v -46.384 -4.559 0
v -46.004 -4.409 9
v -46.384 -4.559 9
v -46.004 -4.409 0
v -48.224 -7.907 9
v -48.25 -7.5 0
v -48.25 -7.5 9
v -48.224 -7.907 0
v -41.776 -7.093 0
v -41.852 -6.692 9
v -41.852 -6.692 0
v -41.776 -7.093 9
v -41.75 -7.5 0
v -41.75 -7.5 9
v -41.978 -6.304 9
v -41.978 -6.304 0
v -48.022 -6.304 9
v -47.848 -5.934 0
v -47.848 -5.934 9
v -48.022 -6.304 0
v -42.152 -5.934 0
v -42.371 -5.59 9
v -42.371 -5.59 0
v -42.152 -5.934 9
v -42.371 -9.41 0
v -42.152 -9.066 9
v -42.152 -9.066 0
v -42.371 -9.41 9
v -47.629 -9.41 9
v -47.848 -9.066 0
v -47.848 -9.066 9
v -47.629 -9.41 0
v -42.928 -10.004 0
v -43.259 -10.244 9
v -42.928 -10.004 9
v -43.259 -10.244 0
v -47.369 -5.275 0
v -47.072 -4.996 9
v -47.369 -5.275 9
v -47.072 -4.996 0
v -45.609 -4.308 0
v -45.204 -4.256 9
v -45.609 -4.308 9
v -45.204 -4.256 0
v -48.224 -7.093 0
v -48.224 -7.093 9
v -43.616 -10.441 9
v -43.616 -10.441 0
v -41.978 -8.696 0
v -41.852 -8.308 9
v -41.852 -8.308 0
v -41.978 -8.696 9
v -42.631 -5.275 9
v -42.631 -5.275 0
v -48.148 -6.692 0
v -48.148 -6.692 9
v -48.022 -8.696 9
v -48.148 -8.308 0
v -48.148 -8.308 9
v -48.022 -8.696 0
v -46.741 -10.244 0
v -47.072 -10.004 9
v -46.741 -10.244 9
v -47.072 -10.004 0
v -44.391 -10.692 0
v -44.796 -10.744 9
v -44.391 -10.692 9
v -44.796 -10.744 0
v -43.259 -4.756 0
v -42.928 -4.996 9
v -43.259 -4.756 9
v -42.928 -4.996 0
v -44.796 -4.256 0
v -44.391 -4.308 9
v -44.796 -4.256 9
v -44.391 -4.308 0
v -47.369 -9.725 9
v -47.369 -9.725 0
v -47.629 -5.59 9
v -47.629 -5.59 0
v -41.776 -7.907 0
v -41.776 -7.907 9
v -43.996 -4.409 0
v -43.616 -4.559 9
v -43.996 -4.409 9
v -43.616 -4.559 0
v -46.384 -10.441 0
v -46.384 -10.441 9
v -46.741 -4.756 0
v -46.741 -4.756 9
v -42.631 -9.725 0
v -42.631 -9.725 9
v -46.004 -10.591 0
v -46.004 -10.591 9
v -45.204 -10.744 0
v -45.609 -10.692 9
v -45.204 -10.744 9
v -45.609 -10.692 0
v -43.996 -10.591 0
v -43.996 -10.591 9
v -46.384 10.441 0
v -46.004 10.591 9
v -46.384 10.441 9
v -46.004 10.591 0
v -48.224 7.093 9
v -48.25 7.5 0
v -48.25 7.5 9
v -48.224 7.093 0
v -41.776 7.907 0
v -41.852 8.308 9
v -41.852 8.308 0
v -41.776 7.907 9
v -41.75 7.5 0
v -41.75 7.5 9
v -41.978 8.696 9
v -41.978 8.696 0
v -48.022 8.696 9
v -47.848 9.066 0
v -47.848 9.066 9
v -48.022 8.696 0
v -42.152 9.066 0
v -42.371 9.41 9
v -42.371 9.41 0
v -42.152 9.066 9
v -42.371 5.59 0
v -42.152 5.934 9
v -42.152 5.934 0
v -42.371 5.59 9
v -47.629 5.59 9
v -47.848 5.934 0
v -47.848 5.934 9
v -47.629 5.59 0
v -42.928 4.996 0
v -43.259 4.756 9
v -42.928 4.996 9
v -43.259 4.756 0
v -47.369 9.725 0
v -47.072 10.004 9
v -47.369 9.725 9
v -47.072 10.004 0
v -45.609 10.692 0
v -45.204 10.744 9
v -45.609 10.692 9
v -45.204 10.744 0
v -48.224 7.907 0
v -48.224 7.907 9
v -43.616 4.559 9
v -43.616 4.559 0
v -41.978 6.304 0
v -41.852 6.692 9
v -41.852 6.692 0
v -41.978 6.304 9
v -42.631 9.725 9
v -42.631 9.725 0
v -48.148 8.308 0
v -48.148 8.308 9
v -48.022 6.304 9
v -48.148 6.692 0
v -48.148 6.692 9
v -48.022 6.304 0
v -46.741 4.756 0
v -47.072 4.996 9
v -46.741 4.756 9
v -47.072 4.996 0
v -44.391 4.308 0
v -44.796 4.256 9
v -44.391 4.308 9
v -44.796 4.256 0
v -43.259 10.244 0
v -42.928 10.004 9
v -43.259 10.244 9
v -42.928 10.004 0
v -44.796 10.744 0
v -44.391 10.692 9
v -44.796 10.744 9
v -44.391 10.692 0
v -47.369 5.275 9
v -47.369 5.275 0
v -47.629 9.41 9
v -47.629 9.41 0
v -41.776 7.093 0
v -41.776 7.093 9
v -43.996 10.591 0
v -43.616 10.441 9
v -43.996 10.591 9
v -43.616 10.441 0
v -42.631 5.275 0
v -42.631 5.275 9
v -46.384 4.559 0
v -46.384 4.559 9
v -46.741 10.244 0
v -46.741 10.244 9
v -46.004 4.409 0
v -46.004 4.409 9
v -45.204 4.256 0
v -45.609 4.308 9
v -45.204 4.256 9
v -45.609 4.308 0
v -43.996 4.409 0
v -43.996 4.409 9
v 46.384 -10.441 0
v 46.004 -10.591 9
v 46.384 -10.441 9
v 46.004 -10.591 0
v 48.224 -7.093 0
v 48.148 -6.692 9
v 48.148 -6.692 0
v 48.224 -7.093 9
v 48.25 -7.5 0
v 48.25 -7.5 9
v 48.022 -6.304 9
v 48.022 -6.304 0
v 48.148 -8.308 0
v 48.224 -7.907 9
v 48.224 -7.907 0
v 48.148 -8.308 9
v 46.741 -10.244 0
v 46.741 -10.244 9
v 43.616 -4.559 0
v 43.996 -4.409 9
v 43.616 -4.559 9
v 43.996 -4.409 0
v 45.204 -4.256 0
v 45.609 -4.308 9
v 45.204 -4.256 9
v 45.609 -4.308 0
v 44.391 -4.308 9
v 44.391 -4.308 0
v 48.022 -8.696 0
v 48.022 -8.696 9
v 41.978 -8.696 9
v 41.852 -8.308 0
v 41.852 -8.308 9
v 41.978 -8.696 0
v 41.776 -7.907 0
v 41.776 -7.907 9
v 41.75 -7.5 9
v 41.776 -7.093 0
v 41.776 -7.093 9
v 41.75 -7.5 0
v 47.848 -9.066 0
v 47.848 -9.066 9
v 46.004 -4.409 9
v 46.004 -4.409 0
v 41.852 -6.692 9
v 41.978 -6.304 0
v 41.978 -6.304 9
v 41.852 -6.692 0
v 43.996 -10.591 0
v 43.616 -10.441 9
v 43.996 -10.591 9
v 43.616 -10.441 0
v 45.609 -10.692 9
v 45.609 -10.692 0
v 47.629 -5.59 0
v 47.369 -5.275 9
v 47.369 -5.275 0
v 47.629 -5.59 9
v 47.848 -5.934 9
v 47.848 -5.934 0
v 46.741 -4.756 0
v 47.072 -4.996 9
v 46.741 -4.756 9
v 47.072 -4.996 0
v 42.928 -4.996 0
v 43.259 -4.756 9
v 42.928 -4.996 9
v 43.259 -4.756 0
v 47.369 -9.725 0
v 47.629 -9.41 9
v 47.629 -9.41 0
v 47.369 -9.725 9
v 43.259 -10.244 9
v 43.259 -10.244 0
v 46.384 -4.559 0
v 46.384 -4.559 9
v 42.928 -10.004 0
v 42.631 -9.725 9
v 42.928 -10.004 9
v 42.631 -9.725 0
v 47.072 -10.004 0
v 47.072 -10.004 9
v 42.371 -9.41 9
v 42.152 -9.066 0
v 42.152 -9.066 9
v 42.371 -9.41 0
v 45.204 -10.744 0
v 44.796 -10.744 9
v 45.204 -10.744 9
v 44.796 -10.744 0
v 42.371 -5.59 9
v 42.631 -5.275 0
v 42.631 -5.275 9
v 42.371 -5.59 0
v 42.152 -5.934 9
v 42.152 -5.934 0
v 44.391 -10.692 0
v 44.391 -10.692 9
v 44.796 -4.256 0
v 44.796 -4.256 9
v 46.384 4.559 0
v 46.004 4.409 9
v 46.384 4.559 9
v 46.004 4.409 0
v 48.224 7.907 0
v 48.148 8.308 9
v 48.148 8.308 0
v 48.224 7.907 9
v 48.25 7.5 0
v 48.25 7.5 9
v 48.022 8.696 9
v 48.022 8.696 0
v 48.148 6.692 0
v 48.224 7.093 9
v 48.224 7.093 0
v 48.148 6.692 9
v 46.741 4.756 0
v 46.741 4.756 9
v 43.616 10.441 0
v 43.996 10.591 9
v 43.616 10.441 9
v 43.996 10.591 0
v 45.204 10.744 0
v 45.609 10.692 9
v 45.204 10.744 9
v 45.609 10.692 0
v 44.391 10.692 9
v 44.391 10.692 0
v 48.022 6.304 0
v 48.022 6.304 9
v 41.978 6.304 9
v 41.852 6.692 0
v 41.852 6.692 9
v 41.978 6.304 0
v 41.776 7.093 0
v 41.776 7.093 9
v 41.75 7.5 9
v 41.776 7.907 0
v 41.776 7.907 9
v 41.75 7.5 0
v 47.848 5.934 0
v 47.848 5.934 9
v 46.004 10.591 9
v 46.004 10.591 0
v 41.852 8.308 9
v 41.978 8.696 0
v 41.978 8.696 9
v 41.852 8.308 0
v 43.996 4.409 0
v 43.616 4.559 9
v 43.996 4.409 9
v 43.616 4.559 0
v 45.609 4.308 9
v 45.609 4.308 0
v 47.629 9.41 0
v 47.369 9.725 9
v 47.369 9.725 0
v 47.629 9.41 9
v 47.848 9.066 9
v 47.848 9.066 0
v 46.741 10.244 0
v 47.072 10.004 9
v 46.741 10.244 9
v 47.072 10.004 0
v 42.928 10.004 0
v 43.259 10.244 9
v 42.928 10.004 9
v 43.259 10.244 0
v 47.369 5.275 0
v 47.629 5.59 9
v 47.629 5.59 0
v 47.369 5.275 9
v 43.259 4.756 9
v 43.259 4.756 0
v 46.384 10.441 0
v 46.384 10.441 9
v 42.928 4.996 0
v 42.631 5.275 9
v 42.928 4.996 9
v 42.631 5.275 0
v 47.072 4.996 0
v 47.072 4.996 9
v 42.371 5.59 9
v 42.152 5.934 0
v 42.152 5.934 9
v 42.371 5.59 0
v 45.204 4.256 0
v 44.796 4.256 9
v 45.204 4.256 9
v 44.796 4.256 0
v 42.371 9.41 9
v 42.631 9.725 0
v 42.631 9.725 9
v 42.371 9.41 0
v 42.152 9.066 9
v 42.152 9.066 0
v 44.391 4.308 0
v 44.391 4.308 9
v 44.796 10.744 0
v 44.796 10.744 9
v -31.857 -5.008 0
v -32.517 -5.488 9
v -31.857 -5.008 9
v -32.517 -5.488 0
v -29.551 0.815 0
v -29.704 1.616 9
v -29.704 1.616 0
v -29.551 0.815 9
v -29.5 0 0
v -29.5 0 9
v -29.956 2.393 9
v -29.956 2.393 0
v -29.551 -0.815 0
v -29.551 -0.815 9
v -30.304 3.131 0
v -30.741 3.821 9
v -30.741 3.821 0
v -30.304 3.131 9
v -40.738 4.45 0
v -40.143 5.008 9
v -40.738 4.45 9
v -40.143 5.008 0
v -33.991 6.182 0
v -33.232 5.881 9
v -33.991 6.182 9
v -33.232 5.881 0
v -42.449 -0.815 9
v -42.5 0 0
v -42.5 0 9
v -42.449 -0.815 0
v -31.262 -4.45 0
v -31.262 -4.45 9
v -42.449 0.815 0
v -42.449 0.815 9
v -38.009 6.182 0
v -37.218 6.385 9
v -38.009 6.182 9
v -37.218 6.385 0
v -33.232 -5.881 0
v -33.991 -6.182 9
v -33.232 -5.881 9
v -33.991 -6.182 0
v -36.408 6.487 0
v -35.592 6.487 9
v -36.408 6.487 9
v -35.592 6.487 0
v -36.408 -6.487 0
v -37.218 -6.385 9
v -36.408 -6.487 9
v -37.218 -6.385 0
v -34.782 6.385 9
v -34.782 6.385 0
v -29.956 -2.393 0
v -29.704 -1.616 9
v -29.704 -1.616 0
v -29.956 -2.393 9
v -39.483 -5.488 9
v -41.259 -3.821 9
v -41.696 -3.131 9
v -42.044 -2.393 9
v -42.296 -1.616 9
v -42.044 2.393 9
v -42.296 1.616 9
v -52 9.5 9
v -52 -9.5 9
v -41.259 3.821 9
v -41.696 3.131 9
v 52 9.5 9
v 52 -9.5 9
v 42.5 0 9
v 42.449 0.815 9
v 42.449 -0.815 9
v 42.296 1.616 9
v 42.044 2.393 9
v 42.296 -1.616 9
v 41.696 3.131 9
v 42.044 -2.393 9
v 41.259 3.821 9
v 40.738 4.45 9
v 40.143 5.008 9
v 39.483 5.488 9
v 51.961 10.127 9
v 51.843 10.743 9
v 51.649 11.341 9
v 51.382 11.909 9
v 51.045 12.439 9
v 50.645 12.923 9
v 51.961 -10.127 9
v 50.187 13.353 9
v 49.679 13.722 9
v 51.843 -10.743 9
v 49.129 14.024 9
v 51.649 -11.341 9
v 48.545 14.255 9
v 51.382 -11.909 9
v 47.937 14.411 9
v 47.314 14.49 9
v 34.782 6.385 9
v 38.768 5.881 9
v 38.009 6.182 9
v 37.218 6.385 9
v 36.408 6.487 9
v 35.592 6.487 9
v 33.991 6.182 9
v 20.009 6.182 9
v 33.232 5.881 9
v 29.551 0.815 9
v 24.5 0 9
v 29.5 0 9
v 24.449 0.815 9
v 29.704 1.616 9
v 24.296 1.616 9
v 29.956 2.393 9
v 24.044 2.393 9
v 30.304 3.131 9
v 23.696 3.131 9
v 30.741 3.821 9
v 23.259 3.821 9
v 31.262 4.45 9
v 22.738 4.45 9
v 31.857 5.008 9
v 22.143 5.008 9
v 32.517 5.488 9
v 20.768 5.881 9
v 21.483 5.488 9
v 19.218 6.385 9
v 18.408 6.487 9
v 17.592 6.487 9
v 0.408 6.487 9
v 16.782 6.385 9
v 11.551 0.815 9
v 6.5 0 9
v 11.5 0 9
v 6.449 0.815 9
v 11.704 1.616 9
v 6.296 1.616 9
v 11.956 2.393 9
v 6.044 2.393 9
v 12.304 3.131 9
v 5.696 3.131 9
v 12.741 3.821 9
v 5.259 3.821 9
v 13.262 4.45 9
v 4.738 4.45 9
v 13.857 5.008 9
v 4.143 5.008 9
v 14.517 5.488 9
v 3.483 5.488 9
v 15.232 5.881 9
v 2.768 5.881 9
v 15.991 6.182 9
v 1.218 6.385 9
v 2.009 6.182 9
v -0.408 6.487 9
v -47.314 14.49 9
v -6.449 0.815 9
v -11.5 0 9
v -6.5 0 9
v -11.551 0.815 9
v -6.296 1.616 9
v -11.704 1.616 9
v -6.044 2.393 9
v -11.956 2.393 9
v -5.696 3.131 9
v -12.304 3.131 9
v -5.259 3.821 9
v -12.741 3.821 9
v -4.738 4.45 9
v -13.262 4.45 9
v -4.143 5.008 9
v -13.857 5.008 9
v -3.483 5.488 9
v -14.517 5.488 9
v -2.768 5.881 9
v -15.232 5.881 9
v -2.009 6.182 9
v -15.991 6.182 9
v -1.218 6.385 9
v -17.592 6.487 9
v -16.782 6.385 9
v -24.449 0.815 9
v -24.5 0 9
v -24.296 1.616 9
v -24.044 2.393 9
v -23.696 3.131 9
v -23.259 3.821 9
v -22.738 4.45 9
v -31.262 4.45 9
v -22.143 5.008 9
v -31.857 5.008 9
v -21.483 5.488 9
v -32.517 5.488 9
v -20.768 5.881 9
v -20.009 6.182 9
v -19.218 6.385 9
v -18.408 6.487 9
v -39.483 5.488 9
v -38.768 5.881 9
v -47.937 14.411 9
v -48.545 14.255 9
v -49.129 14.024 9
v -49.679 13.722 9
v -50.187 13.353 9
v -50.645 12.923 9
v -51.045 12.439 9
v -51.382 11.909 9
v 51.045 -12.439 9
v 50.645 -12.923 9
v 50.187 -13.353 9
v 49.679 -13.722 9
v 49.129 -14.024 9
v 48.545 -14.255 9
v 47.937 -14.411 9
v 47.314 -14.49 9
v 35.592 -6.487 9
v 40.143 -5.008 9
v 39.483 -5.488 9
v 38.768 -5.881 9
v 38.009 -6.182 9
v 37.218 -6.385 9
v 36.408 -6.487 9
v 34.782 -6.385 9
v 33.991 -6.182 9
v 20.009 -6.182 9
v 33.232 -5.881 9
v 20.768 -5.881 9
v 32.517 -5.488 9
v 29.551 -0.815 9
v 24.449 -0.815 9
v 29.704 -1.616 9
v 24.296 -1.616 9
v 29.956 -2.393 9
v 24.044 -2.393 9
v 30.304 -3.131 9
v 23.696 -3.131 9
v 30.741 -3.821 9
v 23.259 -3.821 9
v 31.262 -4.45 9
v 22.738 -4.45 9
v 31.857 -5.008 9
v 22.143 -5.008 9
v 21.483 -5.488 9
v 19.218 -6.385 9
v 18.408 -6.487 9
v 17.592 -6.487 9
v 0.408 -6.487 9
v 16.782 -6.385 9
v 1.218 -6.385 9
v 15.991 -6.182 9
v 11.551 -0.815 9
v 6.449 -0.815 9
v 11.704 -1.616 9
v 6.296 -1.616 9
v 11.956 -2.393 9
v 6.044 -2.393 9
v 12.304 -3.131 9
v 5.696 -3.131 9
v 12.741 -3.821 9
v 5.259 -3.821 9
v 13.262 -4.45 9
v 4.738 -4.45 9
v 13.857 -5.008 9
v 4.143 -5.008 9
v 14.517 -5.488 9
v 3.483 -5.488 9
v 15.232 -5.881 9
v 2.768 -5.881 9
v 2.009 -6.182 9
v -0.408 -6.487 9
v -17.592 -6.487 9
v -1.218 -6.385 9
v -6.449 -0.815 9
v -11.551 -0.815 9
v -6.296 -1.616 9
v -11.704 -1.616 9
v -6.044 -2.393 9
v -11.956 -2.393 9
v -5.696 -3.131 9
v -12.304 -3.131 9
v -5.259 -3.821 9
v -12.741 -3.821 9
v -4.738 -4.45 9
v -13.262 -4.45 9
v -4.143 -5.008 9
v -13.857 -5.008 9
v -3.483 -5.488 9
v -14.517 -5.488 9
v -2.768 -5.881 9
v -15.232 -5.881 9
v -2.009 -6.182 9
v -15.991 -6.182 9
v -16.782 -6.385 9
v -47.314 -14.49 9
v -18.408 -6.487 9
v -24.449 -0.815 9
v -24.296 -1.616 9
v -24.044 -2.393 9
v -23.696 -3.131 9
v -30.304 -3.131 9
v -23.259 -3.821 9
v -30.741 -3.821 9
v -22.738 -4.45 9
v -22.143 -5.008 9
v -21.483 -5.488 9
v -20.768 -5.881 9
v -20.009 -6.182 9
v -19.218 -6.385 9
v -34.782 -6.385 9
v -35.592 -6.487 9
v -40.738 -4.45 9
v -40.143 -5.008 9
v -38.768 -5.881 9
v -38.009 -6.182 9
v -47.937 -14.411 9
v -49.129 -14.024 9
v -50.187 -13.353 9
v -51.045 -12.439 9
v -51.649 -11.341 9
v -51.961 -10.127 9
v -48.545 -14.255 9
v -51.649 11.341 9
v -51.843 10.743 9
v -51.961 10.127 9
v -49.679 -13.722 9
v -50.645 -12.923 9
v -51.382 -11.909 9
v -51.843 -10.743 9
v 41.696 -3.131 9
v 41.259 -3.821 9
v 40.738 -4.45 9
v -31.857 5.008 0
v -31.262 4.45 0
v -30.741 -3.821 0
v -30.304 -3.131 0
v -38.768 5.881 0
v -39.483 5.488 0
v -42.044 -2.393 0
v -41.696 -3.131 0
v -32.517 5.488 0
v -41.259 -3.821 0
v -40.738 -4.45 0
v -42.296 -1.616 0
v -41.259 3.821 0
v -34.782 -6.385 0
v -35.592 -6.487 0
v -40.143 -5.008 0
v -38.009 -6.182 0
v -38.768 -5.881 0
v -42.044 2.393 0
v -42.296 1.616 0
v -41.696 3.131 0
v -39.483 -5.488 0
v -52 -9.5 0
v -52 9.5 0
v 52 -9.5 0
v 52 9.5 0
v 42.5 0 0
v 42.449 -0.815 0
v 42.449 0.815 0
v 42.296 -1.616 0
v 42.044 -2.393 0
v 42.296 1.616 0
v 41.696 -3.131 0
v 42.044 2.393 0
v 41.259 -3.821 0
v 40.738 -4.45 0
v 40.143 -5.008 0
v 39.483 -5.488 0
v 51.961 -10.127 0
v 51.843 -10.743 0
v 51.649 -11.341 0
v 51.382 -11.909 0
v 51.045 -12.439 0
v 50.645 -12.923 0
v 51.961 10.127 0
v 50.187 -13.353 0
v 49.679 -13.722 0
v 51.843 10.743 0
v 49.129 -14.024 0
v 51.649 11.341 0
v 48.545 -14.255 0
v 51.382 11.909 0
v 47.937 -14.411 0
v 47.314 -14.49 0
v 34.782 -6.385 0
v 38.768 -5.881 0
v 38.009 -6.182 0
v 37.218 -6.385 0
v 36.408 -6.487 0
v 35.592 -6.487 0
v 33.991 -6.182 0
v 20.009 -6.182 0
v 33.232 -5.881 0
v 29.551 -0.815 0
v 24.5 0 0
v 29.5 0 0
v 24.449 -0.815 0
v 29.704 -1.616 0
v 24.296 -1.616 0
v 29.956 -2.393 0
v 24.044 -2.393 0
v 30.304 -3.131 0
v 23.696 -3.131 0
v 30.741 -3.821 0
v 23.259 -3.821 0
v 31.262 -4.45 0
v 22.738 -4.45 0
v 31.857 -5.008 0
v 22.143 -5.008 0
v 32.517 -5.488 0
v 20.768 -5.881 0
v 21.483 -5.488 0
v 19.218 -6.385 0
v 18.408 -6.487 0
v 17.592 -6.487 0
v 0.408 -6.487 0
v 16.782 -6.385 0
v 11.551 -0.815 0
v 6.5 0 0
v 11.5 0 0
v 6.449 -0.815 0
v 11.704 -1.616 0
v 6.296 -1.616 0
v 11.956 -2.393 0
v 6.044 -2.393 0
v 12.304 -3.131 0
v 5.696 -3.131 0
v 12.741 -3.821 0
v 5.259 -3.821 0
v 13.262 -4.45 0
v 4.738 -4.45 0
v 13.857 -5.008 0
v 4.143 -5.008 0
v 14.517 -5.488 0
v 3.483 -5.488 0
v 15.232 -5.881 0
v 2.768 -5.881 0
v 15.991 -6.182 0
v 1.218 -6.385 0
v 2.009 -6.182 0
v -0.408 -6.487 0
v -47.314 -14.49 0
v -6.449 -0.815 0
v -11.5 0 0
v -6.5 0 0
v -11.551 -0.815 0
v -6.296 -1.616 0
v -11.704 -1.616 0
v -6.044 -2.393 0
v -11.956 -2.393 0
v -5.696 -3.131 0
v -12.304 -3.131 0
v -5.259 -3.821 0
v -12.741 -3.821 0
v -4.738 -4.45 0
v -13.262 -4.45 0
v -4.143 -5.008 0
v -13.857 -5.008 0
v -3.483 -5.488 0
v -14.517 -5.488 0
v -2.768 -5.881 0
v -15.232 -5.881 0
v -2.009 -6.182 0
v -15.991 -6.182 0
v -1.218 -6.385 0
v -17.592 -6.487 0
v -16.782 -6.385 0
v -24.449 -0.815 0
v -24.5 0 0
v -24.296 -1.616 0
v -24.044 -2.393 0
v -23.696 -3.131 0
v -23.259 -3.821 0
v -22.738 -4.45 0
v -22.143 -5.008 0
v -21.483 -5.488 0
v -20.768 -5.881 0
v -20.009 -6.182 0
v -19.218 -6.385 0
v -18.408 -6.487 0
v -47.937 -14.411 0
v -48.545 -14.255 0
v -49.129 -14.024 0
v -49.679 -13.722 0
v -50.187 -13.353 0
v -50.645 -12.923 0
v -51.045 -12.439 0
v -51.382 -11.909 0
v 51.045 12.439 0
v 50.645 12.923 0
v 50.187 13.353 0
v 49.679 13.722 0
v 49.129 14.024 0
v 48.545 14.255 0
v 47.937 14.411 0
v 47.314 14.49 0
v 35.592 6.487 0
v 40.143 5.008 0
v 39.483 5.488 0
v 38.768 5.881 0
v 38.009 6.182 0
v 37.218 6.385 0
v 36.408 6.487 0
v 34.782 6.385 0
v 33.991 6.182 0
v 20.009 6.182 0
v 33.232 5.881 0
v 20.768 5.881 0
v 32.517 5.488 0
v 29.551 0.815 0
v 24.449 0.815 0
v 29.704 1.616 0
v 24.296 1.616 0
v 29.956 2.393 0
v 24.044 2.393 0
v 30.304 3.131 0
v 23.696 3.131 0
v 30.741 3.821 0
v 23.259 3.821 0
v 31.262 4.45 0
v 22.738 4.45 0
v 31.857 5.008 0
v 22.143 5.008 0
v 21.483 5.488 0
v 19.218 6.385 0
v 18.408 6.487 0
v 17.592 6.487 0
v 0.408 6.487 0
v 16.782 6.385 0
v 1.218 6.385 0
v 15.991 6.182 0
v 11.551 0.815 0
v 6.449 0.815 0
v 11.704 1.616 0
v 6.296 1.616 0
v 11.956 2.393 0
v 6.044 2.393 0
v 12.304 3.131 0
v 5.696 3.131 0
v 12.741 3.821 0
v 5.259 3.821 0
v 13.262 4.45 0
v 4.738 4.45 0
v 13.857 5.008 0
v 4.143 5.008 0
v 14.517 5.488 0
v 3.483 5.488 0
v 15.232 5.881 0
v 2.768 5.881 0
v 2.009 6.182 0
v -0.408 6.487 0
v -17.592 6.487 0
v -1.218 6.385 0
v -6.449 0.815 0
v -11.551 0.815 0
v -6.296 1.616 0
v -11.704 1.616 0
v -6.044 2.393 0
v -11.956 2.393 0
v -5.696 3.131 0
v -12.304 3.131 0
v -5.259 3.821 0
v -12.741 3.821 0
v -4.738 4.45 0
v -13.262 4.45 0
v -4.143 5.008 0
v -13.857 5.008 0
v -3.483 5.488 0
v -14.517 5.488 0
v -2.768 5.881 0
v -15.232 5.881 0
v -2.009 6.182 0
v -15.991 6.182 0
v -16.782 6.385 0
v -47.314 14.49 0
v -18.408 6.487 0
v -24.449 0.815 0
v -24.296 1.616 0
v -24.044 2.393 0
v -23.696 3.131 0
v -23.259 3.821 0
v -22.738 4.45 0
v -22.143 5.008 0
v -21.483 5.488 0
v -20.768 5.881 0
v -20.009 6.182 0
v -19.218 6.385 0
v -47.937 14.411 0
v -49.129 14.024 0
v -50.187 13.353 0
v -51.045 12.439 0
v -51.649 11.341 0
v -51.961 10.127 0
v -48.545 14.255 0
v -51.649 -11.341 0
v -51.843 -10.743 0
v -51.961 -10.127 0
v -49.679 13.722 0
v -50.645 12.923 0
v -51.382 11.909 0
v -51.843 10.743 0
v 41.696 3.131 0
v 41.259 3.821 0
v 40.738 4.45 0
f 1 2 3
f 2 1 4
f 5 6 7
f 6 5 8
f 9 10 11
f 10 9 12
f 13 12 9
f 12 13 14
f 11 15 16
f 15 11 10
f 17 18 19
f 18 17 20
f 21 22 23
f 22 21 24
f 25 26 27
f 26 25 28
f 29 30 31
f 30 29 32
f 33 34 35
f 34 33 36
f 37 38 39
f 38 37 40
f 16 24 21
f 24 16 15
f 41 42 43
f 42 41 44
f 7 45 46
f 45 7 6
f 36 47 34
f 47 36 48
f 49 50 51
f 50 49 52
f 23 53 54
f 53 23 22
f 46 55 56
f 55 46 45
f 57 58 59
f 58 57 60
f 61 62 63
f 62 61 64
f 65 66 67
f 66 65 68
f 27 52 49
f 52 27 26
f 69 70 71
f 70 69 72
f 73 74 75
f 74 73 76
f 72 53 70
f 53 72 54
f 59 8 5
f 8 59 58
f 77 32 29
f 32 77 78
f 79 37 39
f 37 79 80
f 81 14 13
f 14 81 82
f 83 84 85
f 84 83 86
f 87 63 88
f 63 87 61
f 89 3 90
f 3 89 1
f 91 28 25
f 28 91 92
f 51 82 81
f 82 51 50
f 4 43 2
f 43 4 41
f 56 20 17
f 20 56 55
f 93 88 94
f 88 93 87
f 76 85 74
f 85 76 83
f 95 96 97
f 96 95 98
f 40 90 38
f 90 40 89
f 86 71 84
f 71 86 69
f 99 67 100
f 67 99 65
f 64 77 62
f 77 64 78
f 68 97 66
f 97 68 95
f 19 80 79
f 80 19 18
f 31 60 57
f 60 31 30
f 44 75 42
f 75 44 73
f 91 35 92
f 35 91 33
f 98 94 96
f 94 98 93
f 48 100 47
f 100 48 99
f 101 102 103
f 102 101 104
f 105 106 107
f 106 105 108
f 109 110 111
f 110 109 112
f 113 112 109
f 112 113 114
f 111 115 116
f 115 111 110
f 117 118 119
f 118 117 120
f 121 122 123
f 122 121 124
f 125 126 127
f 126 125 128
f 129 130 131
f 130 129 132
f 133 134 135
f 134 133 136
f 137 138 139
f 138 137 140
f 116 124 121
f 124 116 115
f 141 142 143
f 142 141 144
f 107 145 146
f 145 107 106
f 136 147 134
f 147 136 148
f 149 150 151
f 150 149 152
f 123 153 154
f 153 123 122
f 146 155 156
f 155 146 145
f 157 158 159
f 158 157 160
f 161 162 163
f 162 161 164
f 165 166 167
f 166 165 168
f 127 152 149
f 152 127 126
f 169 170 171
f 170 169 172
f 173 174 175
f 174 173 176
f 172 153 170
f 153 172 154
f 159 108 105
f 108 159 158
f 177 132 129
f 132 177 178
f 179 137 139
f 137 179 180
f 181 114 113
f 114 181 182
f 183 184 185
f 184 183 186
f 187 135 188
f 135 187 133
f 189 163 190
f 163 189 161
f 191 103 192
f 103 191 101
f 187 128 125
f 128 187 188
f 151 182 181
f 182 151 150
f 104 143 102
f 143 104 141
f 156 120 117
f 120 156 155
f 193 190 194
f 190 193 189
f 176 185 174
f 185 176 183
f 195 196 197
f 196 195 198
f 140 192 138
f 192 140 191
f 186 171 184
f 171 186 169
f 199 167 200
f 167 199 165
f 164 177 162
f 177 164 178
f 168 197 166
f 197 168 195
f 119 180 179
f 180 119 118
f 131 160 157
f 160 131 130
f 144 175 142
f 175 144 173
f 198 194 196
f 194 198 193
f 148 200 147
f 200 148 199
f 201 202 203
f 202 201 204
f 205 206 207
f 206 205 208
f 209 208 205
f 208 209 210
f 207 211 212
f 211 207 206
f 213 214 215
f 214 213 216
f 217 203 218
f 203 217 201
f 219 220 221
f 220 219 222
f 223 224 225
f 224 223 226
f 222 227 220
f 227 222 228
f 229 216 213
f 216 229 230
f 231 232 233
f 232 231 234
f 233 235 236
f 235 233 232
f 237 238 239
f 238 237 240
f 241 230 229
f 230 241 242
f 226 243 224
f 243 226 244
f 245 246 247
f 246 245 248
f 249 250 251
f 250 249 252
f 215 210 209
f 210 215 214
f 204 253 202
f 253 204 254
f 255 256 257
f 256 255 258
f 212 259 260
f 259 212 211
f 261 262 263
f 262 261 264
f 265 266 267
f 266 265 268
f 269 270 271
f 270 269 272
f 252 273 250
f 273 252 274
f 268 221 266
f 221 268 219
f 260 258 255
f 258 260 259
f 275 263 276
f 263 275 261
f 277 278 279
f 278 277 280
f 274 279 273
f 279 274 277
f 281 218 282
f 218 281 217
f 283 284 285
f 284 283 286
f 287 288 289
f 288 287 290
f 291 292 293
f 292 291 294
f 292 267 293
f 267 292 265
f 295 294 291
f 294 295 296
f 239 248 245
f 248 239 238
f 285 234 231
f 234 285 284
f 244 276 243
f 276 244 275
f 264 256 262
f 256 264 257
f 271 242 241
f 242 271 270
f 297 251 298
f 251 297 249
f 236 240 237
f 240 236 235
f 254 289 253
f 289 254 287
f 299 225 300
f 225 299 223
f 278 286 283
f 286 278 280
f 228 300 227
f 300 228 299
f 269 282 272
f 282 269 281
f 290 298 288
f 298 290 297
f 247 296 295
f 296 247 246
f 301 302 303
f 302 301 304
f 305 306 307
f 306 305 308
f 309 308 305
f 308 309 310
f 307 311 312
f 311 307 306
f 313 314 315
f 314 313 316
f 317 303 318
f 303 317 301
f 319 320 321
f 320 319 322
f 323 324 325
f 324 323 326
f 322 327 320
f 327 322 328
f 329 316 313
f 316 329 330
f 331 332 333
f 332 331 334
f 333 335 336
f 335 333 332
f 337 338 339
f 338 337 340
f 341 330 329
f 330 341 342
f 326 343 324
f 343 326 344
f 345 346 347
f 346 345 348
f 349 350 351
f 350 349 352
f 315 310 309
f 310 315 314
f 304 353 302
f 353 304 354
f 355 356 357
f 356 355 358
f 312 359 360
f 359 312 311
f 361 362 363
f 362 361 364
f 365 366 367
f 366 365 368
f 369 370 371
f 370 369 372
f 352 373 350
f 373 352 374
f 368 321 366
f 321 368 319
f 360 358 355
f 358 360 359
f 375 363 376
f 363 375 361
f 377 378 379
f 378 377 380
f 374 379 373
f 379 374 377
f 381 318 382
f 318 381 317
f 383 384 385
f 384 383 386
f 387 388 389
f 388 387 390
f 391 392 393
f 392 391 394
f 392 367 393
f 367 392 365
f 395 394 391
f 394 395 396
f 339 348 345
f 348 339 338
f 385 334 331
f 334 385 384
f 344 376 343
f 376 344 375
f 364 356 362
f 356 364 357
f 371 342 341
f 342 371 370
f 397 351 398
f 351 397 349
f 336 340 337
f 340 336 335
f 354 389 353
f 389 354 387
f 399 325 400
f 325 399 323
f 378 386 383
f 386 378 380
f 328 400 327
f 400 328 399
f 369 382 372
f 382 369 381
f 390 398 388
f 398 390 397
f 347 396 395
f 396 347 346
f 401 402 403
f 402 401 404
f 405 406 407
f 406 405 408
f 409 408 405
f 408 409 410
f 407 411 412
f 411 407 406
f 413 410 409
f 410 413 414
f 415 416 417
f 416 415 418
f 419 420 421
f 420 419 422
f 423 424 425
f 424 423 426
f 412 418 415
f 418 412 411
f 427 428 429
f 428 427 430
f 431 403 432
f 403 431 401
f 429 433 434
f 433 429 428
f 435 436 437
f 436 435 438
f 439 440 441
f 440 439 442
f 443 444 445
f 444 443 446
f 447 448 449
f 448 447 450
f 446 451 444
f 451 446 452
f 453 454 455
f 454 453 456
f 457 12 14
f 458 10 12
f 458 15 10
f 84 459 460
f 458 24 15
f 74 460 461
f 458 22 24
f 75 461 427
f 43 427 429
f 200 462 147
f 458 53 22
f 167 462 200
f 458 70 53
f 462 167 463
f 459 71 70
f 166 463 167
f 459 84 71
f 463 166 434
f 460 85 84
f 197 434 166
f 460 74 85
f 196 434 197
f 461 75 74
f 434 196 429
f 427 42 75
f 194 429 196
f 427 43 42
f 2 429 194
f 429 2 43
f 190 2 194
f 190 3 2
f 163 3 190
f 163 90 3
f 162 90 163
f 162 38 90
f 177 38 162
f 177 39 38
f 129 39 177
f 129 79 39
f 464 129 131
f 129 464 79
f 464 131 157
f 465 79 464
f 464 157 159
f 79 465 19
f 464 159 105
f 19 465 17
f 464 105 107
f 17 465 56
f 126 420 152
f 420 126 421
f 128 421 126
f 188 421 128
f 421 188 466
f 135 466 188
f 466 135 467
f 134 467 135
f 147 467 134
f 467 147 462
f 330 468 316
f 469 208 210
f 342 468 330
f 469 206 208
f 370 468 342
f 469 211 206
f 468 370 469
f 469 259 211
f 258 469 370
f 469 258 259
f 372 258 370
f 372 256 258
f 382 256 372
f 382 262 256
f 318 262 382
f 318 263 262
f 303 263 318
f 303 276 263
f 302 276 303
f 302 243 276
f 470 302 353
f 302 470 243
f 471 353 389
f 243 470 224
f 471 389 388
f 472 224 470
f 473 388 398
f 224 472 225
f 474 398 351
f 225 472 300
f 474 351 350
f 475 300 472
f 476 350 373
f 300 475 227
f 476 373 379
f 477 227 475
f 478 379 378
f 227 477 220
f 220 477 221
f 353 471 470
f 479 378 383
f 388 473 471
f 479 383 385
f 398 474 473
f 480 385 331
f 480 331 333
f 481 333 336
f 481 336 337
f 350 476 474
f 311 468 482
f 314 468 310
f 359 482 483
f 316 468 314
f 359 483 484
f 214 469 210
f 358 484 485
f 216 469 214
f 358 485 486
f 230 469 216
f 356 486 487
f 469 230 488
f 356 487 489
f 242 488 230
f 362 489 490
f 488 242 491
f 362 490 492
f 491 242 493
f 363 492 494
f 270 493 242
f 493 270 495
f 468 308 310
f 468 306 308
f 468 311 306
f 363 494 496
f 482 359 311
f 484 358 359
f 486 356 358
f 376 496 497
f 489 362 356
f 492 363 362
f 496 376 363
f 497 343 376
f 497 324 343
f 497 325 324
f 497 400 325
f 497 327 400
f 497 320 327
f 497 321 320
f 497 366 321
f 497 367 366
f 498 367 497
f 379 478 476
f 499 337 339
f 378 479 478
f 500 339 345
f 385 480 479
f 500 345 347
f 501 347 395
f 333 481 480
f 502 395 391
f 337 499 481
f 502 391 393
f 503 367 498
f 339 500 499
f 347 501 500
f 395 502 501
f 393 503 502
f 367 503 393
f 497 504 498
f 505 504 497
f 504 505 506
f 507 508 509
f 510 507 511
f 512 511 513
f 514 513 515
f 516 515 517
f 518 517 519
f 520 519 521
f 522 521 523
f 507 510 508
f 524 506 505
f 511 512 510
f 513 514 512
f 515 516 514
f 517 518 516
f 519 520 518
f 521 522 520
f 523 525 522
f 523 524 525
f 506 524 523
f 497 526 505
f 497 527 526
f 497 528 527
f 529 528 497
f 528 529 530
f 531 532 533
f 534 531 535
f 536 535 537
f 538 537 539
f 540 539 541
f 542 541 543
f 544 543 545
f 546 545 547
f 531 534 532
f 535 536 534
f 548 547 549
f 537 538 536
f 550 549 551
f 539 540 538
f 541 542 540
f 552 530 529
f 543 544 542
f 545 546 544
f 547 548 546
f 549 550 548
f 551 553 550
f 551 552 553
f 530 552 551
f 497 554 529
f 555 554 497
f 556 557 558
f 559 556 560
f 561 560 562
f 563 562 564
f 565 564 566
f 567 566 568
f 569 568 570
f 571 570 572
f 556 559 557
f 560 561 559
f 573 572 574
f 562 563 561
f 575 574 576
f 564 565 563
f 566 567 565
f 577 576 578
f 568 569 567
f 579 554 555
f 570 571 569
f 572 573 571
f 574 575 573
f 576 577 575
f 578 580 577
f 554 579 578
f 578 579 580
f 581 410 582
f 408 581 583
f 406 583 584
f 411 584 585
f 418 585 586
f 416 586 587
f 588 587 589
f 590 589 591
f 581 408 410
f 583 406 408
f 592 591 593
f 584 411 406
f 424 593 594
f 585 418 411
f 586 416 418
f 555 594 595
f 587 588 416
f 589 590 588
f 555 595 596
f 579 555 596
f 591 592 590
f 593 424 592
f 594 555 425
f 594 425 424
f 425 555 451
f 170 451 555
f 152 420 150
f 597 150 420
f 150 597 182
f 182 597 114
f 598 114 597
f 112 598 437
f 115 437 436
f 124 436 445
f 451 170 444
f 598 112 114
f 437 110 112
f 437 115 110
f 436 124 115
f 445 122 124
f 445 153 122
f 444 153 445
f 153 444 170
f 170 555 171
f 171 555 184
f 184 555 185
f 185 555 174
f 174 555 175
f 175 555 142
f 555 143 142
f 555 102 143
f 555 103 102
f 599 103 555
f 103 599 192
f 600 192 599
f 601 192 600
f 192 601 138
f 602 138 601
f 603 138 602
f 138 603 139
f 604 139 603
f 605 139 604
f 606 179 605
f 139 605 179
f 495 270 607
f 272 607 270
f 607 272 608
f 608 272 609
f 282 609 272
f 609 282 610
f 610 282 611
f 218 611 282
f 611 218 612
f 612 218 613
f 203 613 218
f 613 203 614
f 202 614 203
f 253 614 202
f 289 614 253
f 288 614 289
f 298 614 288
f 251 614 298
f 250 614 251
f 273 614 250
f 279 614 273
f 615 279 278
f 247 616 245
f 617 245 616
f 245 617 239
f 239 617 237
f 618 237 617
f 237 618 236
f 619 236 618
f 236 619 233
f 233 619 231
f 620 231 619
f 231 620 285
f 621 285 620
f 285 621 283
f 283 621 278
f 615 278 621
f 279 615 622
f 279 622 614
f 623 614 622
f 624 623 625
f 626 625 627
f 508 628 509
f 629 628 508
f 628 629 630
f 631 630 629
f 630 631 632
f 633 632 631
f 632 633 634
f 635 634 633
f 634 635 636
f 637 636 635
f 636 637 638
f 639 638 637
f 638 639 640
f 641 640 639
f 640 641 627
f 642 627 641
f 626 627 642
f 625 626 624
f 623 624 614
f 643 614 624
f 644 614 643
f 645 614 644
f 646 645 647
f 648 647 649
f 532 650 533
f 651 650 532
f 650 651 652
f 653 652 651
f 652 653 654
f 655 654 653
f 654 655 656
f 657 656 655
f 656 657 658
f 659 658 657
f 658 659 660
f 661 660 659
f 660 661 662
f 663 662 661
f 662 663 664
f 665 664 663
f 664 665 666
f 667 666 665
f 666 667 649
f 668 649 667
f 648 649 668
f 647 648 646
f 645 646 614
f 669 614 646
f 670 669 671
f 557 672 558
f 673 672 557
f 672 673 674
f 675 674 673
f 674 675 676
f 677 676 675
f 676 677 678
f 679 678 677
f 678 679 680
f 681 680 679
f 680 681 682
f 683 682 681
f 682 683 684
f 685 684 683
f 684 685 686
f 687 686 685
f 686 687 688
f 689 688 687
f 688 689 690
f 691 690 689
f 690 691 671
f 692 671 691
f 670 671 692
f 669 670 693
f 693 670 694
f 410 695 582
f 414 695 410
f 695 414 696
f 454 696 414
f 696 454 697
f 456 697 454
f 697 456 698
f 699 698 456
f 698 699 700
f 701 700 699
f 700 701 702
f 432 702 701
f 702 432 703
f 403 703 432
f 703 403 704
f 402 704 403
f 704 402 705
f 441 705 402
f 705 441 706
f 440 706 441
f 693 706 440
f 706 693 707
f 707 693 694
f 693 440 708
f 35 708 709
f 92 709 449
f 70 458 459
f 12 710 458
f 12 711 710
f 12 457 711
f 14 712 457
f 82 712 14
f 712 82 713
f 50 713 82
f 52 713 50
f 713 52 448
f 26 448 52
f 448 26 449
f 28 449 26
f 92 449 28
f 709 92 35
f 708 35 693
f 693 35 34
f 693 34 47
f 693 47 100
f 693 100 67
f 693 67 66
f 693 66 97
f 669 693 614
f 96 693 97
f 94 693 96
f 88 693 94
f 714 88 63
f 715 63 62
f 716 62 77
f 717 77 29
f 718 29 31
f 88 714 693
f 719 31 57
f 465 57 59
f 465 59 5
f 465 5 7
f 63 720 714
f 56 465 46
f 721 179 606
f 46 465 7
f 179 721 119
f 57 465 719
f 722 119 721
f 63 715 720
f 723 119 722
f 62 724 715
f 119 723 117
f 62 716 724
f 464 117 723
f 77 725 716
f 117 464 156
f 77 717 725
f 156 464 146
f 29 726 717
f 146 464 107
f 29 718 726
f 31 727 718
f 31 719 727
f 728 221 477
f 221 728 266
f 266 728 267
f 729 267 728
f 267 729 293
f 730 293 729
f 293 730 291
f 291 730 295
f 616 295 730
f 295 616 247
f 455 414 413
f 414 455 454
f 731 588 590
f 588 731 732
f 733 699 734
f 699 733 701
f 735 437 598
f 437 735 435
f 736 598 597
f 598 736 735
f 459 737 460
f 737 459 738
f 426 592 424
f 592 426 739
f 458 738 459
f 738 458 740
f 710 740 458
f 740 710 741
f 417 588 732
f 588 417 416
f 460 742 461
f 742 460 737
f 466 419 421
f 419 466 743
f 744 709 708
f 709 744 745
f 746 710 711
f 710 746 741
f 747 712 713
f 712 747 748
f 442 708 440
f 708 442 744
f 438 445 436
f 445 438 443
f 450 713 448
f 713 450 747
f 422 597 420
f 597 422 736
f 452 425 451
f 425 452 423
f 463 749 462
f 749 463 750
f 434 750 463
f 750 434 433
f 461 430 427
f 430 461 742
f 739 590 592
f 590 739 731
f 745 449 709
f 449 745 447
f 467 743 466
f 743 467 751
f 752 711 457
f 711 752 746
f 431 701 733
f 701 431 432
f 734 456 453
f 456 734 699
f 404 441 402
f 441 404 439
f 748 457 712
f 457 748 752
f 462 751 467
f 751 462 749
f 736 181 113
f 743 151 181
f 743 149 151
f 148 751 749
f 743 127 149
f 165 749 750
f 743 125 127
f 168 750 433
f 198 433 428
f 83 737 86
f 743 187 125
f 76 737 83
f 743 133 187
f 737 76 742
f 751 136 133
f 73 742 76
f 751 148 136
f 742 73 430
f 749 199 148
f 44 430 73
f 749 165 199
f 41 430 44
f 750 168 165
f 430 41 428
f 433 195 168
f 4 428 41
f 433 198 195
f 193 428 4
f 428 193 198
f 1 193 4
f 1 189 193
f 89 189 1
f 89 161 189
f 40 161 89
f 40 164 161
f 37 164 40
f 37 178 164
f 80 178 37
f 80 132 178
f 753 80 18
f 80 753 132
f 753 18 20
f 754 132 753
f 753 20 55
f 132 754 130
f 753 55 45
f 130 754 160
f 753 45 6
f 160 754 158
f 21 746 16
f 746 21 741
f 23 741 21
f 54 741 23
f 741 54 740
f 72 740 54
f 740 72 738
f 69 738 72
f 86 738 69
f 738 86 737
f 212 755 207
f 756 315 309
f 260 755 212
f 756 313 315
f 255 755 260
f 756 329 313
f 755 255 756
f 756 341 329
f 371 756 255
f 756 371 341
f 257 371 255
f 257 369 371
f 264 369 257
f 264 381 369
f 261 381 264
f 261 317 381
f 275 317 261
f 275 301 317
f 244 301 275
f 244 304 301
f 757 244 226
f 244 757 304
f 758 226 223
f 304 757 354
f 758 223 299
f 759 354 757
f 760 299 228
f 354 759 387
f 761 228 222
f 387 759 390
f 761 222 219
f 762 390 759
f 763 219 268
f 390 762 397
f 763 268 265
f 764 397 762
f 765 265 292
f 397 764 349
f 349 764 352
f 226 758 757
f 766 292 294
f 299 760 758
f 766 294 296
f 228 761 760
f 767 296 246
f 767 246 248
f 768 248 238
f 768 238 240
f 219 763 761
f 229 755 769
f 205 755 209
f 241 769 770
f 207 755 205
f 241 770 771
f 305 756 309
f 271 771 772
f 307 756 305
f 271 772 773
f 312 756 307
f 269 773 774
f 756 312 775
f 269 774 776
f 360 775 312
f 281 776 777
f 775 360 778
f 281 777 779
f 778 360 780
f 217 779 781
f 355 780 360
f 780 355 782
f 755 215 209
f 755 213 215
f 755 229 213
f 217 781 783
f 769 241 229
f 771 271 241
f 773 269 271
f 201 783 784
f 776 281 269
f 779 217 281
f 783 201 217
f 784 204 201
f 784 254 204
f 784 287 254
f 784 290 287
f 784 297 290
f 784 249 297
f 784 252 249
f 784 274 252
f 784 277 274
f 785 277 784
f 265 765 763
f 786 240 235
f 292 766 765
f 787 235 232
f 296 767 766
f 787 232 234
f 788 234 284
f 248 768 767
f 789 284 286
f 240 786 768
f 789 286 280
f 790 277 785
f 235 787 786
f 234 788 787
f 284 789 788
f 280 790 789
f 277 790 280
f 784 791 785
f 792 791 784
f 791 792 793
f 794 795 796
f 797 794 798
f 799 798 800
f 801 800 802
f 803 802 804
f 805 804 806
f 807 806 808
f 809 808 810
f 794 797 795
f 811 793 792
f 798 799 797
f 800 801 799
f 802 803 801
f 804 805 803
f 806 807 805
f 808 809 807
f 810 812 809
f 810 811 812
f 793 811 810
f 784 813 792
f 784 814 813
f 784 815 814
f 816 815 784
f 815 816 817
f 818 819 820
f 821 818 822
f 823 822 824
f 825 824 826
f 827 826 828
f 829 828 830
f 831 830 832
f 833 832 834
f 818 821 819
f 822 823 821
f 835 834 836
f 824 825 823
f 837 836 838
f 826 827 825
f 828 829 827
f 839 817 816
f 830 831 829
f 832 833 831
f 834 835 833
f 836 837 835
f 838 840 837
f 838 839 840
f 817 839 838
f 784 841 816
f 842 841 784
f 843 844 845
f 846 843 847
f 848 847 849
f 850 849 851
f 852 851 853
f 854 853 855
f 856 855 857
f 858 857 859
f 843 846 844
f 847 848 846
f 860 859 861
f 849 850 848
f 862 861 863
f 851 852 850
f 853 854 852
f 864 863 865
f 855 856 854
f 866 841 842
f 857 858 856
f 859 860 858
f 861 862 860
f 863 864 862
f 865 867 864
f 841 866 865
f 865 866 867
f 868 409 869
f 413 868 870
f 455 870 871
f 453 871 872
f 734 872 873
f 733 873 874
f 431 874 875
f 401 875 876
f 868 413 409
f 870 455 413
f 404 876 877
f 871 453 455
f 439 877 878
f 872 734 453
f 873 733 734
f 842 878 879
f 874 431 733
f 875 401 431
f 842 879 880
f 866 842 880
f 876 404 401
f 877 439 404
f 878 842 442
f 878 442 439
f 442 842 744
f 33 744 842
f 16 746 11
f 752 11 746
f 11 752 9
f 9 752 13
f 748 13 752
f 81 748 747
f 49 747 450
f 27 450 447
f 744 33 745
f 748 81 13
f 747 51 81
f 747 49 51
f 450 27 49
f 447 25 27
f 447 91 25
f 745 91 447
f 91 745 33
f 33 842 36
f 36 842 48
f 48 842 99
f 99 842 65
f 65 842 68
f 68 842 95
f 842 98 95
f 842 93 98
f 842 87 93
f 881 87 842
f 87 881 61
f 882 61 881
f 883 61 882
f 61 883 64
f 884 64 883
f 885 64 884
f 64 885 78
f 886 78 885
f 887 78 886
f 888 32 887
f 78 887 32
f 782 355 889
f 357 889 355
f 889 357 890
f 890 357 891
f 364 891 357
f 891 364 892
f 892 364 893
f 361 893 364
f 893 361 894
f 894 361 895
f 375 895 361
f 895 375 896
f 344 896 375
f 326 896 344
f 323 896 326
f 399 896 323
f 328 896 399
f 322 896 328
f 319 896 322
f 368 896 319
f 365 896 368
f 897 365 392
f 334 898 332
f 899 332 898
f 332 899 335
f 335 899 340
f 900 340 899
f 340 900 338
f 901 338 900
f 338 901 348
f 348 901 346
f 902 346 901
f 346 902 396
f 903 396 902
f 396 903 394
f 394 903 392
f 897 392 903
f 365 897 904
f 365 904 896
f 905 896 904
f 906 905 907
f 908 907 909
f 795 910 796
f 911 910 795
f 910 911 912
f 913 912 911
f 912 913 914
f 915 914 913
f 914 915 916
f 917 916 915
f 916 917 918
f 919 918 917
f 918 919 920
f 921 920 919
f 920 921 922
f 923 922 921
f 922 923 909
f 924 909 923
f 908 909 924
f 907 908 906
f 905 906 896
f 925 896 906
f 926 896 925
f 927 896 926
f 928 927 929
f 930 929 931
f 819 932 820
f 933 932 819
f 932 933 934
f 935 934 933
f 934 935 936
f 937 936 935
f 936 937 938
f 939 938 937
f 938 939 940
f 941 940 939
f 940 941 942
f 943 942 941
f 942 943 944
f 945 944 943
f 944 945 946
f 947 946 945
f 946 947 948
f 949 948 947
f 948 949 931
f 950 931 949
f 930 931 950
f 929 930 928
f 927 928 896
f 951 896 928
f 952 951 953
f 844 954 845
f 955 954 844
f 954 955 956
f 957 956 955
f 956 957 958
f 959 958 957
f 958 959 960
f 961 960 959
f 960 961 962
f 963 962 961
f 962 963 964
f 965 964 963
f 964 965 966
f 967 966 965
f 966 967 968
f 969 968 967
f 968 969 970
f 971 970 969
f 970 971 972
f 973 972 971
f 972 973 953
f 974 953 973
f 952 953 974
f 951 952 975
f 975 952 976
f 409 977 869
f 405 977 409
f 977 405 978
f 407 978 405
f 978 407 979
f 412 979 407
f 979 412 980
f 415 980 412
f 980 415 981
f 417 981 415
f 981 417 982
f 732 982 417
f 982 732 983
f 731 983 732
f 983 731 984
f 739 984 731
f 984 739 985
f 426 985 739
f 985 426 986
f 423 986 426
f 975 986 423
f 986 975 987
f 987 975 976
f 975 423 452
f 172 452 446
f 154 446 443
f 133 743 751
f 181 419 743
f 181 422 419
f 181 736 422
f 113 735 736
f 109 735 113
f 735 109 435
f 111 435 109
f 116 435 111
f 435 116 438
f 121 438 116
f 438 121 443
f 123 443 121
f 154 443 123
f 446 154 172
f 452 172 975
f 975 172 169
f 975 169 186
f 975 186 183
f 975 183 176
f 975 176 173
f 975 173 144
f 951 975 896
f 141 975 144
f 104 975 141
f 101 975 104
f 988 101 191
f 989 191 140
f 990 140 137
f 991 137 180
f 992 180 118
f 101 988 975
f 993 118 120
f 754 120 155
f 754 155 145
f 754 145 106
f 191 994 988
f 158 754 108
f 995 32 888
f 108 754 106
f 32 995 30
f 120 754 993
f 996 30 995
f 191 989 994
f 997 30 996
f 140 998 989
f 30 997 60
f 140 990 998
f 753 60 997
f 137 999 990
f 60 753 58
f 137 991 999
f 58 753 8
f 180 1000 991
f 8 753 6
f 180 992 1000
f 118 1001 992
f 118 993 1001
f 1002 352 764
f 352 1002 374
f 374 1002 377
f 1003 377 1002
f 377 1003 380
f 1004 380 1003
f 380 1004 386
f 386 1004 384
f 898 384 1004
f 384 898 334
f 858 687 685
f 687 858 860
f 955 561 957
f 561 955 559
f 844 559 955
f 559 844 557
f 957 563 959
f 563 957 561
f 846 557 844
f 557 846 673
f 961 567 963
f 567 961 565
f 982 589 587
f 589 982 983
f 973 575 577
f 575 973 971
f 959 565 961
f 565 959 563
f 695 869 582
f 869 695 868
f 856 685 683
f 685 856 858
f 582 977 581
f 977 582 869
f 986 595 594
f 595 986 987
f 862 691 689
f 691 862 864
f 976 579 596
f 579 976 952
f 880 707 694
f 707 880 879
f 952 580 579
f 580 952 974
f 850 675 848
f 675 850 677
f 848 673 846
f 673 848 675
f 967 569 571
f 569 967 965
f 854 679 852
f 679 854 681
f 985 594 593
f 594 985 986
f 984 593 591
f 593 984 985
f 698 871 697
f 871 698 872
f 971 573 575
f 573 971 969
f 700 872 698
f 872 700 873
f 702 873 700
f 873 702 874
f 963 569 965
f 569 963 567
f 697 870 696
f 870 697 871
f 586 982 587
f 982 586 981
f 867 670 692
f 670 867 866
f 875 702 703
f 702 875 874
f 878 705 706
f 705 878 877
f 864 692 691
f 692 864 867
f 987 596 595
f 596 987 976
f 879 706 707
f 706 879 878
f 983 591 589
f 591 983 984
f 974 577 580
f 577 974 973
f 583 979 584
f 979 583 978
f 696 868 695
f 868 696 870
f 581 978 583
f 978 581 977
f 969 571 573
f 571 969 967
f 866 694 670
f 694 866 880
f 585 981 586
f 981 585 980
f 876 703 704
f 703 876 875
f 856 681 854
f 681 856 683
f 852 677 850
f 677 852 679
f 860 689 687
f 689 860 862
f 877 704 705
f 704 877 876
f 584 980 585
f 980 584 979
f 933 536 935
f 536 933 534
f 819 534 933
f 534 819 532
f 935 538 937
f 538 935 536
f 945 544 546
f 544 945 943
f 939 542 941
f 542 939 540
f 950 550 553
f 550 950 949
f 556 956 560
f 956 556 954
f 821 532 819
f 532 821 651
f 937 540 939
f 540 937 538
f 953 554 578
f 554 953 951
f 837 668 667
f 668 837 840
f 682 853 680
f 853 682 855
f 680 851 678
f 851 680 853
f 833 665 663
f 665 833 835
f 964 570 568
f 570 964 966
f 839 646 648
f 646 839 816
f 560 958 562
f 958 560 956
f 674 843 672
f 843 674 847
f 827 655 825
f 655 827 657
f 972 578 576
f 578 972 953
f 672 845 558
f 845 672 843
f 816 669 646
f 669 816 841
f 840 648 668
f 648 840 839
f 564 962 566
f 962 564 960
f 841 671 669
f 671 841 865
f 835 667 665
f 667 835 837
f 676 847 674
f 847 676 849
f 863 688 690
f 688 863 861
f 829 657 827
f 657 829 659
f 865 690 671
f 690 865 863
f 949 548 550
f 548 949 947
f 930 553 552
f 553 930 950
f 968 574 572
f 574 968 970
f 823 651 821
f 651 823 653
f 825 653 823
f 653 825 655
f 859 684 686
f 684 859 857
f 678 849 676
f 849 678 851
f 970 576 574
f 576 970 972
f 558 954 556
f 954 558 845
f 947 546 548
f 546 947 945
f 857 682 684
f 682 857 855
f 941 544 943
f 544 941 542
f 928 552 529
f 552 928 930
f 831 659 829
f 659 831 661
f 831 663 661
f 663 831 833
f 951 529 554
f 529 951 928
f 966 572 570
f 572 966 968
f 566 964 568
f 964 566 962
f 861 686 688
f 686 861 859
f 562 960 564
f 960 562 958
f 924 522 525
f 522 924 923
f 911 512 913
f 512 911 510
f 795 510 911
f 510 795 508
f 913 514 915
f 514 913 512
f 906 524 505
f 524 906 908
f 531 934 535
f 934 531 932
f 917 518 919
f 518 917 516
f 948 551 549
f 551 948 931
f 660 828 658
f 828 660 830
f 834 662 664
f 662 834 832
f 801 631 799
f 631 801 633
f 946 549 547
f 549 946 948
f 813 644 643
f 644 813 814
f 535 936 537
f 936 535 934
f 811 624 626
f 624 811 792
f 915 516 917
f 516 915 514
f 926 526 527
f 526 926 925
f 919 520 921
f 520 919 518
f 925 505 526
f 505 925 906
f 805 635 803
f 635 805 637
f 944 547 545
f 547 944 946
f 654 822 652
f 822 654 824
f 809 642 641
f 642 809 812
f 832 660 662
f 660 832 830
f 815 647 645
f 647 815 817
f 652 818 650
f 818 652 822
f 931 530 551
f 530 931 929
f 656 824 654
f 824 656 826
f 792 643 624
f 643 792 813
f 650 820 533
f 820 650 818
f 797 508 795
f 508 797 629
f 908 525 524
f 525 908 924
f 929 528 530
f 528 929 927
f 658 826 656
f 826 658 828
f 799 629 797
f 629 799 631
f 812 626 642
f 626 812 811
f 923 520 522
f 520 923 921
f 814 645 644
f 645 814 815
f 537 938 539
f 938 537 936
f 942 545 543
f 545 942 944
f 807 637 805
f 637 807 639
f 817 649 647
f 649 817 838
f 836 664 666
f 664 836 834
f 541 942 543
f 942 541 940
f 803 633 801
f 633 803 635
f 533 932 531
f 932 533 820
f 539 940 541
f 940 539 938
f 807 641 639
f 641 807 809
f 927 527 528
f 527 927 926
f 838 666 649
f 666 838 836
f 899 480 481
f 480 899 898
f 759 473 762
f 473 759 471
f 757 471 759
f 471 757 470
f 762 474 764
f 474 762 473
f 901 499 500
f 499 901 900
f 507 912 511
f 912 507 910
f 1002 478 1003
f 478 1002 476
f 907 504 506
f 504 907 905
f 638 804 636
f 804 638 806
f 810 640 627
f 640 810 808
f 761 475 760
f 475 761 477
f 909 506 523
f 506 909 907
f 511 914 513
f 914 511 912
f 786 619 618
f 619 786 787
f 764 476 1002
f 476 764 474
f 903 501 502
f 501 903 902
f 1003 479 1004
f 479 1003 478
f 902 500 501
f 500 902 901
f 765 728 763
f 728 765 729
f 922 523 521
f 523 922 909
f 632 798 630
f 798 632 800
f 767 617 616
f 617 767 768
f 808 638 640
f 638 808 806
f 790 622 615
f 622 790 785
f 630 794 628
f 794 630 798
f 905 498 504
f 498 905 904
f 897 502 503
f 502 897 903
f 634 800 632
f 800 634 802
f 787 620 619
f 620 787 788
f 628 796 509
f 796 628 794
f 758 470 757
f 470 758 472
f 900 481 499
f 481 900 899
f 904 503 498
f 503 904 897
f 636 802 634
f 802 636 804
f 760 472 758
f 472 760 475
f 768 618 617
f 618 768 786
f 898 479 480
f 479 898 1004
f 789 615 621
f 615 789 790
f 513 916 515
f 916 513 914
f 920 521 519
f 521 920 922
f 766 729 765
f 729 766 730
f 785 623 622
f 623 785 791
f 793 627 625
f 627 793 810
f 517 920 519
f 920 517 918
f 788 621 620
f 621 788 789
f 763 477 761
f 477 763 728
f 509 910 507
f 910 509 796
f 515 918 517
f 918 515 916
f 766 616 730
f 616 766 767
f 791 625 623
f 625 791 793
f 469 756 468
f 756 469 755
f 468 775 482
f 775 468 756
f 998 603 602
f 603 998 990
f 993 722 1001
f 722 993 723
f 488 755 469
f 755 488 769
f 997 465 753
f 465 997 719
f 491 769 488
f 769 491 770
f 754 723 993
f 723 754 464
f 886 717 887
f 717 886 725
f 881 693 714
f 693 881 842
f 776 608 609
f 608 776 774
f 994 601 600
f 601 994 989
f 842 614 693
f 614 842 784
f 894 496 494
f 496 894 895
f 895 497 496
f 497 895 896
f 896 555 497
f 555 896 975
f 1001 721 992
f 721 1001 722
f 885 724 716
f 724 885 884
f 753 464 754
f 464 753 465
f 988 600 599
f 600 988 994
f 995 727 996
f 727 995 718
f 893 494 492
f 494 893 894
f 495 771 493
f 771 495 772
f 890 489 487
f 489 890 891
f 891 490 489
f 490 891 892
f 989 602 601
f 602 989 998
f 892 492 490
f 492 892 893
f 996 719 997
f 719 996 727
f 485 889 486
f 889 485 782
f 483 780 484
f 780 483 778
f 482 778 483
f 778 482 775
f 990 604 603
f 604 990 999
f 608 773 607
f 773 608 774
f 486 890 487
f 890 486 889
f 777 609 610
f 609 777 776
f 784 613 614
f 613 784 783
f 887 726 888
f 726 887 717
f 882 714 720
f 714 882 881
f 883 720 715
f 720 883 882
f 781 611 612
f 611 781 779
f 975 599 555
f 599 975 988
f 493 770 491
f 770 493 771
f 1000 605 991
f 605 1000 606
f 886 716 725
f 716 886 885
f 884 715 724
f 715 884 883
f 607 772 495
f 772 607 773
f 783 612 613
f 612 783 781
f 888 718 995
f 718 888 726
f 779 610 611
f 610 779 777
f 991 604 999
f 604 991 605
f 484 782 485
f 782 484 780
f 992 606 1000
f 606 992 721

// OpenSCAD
$fn = 50;

difference() {
	union() {
		hull() {
			translate(v = [-47.0, 9.5, 0]) {
				cylinder(h = 9, r = 5);
			}
			translate(v = [47.0, 9.5, 0]) {
				cylinder(h = 9, r = 5);
			}
			translate(v = [-47.0, -9.5, 0]) {
				cylinder(h = 9, r = 5);
			}
			translate(v = [47.0, -9.5, 0]) {
				cylinder(h = 9, r = 5);
			}
		}
	}
	union() {
		translate(v = [-45.0, -7.5, -100.0]) {
			cylinder(h = 200, r = 3.25);
		}
		translate(v = [-45.0, 7.5, -100.0]) {
			cylinder(h = 200, r = 3.25);
		}
		translate(v = [45.0, -7.5, -100.0]) {
			cylinder(h = 200, r = 3.25);
		}
		translate(v = [45.0, 7.5, -100.0]) {
			cylinder(h = 200, r = 3.25);
		}
		translate(v = [-45.0, -7.5, -100.0]) {
			cylinder(h = 200, r = 1.8);
		}
		translate(v = [-45.0, 7.5, -100.0]) {
			cylinder(h = 200, r = 1.8);
		}
		translate(v = [45.0, -7.5, -100.0]) {
			cylinder(h = 200, r = 1.8);
		}
		translate(v = [45.0, 7.5, -100.0]) {
			cylinder(h = 200, r = 1.8);
		}
		translate(v = [-36.0, 0, 0.0]) {
			cylinder(h = 9, r = 6.5);
		}
		translate(v = [-18.0, 0, 0.0]) {
			cylinder(h = 9, r = 6.5);
		}
		cylinder(h = 9, r = 6.5);
		translate(v = [18.0, 0, 0.0]) {
			cylinder(h = 9, r = 6.5);
		}
		translate(v = [36.0, 0, 0.0]) {
			cylinder(h = 9, r = 6.5);
		}
	}
}
